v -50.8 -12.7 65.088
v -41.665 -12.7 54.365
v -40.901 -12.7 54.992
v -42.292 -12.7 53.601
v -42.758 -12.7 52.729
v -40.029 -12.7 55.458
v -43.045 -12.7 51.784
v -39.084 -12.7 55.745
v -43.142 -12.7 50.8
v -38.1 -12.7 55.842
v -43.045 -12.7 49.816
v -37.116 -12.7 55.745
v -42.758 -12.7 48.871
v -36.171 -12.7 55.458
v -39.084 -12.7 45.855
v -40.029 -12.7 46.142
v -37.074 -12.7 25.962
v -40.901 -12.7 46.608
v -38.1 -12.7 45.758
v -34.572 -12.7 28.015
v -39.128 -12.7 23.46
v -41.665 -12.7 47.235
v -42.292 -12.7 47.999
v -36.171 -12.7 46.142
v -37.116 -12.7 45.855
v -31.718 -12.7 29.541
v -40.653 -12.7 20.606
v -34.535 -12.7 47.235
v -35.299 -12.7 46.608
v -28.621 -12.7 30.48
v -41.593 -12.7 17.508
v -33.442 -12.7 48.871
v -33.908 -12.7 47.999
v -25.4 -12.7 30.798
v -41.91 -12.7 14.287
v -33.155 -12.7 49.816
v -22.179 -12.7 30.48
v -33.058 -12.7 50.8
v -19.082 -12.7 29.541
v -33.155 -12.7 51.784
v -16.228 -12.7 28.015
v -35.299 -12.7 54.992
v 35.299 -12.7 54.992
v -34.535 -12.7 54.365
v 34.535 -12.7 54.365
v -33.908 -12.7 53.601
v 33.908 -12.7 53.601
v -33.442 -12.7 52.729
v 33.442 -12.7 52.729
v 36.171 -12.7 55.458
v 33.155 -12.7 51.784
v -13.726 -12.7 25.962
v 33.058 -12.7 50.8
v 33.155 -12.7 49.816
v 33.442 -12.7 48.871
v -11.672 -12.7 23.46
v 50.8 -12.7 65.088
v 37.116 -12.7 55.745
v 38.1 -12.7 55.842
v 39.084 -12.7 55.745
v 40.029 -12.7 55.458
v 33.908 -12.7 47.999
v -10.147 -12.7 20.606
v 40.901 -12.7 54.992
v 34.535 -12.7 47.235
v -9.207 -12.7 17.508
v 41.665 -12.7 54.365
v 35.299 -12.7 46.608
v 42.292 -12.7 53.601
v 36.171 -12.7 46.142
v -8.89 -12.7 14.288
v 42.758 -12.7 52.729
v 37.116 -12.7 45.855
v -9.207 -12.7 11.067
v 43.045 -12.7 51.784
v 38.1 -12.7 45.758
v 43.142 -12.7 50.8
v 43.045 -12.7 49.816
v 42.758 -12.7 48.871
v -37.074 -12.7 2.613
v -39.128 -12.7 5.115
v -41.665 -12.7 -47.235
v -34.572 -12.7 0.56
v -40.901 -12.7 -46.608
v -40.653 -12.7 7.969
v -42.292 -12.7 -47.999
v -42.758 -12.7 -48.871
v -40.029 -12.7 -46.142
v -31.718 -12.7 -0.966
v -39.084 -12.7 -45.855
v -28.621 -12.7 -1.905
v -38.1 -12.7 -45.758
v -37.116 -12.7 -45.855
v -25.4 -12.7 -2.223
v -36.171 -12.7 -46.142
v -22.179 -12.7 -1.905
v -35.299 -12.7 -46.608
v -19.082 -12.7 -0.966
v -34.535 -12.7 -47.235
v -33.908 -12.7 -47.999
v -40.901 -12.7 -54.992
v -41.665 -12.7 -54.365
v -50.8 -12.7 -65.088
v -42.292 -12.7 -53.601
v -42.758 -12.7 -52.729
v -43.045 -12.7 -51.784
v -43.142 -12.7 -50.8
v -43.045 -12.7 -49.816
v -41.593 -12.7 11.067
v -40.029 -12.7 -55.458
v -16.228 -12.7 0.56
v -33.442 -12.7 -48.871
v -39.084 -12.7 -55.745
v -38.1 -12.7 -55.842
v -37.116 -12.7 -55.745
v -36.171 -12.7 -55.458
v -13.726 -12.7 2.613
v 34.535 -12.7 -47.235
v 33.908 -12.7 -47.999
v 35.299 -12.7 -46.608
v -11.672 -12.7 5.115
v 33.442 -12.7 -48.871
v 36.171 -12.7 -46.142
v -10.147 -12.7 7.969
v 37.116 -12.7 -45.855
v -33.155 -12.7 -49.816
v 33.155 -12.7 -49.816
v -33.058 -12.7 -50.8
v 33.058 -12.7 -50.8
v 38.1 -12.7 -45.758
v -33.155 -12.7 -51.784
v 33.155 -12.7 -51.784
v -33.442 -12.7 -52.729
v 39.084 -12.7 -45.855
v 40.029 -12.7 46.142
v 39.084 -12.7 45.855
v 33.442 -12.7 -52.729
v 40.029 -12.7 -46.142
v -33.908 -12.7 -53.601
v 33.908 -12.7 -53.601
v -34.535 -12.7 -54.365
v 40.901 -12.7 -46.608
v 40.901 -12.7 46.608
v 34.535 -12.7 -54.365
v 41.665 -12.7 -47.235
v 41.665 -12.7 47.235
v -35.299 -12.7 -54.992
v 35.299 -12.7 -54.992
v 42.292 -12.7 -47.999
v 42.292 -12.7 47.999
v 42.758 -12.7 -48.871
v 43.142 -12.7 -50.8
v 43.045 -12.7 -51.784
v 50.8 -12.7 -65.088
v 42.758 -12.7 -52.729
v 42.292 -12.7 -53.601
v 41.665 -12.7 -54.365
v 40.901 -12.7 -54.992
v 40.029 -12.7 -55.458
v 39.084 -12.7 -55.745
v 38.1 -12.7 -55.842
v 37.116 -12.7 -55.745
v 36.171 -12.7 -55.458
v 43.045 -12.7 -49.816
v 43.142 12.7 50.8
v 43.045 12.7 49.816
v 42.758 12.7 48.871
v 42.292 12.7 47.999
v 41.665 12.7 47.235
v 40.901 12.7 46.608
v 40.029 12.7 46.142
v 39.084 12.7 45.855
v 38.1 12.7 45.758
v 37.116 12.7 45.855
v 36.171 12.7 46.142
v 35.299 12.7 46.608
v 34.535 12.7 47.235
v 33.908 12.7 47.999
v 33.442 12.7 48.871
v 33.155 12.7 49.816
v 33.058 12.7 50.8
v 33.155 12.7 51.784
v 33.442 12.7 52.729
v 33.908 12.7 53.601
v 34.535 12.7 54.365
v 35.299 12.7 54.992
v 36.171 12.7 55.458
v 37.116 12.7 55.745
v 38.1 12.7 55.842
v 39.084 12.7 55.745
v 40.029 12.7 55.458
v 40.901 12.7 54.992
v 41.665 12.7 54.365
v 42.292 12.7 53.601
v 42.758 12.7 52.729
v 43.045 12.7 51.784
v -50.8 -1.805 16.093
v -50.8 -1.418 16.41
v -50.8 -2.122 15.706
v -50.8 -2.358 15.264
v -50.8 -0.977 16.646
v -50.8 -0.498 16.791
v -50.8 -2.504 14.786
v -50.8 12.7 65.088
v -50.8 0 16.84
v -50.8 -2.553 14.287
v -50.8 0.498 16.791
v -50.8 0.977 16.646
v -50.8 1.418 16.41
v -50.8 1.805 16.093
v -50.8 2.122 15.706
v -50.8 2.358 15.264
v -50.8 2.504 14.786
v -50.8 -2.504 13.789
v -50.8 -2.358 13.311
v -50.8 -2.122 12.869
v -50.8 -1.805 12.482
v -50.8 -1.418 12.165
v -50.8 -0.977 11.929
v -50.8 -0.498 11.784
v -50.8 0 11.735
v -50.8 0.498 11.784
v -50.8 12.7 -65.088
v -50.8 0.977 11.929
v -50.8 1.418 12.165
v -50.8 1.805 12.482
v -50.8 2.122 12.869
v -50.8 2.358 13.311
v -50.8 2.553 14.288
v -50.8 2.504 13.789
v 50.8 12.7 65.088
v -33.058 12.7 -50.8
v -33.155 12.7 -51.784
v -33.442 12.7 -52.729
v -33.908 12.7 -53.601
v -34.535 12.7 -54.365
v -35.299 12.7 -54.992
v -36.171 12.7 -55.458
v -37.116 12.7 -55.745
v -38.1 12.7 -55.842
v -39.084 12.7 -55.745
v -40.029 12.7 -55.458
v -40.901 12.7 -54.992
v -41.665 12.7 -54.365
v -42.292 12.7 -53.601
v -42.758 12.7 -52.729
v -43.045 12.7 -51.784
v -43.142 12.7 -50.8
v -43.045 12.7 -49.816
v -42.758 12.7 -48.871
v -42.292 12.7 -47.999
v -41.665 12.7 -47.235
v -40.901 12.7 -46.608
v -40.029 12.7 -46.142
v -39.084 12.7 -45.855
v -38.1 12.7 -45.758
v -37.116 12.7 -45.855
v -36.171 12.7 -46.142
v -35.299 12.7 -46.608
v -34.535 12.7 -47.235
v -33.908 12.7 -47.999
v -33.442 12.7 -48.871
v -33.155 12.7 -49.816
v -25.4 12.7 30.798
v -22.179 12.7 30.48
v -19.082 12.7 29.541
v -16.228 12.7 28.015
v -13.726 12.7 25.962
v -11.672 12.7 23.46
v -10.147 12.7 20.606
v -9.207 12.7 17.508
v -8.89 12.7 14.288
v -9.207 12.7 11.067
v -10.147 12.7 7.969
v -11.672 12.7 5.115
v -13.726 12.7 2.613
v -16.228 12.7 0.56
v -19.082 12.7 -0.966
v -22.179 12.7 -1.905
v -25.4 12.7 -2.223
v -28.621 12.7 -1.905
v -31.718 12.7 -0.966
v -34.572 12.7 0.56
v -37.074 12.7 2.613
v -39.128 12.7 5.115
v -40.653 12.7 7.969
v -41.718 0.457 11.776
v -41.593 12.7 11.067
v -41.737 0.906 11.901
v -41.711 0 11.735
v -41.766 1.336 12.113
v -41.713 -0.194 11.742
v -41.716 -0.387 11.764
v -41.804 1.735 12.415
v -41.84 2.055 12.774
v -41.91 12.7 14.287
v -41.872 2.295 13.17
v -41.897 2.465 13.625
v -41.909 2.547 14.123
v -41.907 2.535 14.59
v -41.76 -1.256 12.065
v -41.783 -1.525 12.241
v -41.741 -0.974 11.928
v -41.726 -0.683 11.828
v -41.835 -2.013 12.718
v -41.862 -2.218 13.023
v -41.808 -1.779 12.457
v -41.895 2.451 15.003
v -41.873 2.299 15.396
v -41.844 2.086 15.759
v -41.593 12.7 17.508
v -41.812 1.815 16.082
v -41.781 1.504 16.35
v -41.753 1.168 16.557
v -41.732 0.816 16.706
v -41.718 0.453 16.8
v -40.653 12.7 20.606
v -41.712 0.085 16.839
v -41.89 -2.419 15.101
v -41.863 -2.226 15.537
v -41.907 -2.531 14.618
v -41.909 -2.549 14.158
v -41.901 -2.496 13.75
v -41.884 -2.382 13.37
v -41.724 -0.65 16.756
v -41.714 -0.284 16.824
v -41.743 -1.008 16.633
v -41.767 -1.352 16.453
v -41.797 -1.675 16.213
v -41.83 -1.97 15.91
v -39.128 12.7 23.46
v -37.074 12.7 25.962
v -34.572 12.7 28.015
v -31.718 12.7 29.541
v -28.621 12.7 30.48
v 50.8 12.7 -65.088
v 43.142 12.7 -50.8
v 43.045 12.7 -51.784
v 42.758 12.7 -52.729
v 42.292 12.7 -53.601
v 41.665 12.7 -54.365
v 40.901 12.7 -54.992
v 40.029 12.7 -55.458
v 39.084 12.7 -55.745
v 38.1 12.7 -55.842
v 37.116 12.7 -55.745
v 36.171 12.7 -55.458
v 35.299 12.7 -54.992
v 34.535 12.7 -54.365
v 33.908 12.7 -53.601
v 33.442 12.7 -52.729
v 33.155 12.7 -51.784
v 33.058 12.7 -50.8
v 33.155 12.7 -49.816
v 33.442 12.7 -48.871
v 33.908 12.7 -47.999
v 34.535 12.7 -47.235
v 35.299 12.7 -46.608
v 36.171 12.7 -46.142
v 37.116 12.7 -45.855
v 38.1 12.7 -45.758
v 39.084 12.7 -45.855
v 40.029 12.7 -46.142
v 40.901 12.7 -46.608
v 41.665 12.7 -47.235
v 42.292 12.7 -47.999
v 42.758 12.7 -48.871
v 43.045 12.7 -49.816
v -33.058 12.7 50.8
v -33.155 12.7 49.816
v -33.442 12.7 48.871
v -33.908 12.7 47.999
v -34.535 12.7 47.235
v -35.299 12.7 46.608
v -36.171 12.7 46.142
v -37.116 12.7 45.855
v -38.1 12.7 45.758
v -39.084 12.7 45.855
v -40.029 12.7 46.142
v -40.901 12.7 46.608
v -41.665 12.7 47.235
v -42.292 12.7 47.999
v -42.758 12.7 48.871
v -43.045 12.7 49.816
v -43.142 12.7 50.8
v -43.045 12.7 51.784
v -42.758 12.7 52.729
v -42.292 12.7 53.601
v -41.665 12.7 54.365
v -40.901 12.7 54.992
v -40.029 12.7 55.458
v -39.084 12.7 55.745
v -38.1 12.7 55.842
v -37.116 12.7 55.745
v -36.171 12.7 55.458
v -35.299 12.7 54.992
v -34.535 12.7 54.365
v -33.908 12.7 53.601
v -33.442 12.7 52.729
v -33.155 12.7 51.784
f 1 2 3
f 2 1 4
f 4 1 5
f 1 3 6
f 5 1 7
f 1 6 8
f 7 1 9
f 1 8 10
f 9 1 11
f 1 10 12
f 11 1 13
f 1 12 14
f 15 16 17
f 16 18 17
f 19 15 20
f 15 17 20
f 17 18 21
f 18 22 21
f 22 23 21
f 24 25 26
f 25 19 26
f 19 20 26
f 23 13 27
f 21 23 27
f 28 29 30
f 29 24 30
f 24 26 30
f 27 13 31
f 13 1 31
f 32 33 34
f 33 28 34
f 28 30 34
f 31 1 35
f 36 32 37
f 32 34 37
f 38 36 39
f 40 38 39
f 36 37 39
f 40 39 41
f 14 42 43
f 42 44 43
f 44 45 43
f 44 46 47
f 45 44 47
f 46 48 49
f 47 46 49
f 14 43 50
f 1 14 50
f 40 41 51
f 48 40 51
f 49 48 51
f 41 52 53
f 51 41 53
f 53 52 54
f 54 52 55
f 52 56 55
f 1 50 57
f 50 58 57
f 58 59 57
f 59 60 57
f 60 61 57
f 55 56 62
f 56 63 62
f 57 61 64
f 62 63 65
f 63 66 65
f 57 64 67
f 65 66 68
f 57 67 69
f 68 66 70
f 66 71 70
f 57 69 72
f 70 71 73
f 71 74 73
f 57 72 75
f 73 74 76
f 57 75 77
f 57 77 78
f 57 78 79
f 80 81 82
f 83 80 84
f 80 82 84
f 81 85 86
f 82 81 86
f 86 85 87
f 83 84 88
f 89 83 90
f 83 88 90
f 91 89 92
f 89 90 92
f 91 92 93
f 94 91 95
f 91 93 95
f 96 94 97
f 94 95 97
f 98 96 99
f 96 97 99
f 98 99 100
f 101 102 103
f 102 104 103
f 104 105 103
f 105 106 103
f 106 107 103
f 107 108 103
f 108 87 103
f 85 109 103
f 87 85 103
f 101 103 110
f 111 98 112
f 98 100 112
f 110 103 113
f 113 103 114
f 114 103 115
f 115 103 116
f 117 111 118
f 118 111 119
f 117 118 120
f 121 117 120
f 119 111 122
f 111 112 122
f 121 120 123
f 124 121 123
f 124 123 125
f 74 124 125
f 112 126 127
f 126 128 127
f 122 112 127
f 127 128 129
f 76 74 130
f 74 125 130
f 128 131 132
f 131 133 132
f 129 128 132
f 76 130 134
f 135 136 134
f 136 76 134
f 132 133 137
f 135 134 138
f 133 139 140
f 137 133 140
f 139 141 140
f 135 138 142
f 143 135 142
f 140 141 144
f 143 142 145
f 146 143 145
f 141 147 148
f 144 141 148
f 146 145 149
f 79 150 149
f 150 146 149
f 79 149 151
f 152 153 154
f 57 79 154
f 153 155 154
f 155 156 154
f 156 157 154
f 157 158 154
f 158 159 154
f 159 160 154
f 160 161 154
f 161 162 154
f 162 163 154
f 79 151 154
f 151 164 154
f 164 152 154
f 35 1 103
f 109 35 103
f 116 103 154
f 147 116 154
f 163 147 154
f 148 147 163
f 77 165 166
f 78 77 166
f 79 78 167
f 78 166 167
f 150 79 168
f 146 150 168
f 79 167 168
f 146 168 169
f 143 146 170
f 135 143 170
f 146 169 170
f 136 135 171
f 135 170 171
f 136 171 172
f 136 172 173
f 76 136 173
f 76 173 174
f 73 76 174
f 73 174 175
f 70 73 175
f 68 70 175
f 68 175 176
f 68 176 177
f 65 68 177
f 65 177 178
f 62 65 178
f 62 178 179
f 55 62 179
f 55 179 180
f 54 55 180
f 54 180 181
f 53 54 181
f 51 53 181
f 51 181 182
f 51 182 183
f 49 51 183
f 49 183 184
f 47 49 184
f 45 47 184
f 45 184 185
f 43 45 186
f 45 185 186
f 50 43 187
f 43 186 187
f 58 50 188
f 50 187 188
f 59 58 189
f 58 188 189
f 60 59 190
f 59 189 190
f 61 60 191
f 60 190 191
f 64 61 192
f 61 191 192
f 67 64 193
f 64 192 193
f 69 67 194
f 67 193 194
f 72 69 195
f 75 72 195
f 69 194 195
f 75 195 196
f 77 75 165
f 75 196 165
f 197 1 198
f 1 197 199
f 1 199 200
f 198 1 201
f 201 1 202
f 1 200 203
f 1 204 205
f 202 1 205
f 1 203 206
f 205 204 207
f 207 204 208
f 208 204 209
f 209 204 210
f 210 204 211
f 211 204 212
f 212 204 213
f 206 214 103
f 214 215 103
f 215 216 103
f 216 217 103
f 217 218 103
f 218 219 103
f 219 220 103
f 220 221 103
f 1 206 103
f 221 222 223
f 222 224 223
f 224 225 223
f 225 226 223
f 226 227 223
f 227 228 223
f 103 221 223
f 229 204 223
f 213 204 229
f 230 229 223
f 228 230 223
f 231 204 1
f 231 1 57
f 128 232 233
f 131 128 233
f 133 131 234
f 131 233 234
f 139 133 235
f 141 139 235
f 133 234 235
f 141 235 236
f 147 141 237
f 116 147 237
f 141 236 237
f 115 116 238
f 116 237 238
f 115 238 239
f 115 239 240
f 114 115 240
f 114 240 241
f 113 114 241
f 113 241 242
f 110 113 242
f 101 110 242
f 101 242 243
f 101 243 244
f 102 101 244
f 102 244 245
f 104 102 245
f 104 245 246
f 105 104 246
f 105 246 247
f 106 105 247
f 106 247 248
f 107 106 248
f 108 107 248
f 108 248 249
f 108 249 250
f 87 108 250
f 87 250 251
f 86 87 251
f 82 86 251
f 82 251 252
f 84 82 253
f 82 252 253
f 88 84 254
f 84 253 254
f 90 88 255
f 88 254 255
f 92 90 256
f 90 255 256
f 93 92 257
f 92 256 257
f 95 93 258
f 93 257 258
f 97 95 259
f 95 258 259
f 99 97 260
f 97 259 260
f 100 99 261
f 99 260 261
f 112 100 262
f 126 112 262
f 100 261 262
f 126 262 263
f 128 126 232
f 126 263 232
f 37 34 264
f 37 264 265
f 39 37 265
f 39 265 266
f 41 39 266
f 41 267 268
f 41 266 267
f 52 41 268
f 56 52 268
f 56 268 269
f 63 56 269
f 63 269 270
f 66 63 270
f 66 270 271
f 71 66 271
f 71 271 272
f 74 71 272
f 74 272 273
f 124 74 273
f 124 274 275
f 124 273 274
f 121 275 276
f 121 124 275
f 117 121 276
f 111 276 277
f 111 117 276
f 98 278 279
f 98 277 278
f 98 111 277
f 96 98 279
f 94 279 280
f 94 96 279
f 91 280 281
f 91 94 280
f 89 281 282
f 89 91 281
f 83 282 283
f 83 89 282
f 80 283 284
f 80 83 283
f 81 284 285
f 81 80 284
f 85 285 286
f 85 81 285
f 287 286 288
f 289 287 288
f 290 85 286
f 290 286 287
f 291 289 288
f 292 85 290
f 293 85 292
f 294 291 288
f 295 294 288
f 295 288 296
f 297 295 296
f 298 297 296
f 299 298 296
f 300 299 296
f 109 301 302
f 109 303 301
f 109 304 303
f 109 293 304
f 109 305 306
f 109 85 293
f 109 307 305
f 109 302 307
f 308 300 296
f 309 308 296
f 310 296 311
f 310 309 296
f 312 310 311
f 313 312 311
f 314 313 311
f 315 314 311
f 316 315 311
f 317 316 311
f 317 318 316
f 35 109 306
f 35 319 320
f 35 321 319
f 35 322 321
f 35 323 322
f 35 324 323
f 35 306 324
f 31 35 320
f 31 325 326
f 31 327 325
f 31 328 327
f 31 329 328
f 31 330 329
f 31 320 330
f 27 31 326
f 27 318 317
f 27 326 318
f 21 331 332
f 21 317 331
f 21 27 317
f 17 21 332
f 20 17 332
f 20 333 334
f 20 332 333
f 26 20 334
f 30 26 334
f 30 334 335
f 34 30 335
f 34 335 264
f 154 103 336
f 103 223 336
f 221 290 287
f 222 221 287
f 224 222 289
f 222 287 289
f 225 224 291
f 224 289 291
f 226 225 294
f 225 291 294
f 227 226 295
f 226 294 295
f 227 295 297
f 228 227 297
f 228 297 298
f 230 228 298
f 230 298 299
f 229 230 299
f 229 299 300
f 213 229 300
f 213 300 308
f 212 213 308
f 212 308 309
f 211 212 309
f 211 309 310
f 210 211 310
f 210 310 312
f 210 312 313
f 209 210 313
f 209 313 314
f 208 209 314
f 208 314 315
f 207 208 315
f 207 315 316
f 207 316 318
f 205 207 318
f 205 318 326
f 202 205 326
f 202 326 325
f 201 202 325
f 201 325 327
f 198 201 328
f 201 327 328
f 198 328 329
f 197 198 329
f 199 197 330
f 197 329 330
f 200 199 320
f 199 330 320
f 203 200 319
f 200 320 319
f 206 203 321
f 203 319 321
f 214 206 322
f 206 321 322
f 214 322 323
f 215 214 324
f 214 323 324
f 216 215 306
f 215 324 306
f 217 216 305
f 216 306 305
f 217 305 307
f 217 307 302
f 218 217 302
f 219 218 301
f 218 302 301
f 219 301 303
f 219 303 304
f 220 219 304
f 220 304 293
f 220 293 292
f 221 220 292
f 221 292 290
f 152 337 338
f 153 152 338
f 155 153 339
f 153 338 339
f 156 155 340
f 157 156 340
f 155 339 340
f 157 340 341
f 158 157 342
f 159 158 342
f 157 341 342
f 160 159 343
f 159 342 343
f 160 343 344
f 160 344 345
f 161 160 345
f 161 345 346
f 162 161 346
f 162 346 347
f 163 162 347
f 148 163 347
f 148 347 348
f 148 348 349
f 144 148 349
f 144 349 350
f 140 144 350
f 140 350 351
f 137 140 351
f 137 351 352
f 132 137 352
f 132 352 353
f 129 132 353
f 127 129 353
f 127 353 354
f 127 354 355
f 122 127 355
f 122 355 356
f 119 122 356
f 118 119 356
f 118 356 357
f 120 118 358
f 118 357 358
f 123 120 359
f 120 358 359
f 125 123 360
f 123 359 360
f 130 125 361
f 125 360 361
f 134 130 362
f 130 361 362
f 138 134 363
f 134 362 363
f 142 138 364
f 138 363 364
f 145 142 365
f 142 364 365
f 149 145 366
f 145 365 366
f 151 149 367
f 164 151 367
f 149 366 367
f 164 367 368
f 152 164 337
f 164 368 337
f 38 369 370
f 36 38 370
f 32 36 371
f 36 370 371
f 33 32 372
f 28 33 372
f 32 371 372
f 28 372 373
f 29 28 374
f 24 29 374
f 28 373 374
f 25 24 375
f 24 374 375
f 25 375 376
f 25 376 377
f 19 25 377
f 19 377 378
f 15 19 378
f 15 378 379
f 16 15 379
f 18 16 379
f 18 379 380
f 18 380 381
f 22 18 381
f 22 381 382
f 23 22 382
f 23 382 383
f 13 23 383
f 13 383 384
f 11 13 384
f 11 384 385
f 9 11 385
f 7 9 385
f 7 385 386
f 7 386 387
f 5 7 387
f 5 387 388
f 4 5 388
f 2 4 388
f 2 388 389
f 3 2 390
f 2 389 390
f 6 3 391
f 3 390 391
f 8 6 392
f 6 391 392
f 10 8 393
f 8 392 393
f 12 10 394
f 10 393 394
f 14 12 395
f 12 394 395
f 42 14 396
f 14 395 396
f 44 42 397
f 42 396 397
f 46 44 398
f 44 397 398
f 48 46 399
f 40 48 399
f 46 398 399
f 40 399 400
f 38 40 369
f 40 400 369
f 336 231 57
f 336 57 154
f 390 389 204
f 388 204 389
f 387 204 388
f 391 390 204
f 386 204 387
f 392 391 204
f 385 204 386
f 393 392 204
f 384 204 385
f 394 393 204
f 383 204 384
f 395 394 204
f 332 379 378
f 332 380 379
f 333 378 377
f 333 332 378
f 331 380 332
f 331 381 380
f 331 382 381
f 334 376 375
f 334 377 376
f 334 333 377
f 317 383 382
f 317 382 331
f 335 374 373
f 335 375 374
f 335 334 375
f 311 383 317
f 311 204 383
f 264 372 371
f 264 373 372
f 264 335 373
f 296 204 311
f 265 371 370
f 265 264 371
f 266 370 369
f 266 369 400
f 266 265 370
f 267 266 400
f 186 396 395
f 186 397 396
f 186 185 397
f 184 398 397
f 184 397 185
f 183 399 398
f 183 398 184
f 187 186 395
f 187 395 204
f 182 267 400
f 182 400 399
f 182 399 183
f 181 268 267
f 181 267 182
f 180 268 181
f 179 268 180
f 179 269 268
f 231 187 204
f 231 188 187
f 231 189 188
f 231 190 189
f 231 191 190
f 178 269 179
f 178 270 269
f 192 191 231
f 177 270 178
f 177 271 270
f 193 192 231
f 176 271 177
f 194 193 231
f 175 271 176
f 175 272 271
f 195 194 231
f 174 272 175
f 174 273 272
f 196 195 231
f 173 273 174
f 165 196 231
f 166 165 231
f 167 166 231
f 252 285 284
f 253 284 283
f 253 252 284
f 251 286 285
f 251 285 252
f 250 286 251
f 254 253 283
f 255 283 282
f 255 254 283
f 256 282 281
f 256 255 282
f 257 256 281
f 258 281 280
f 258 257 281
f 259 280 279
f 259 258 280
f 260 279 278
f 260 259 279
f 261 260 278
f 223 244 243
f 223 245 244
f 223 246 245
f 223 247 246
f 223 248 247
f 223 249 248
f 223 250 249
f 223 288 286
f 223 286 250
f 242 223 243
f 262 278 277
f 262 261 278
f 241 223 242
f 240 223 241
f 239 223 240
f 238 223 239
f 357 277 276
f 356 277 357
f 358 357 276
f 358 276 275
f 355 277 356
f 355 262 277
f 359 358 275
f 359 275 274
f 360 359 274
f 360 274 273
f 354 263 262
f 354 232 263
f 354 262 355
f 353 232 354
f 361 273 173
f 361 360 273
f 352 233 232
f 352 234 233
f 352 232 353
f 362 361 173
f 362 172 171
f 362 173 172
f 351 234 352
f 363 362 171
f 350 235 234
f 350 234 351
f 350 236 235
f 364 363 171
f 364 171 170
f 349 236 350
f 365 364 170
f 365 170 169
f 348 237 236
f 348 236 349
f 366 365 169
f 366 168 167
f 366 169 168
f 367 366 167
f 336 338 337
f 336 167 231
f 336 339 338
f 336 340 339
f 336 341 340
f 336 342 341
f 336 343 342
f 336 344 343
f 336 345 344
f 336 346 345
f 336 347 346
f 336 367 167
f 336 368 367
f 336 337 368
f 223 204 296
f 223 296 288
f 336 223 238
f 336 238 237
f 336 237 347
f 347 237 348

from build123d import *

# Parameters (mm, degrees)
SKETCH1_W                   = 101.6
SKETCH1_H                   = 130.175
BOSS_EXTRUDE1_DEPTH         = 12.7
CUT_EXTRUDE1_DEPTH          = 87.383925914
CUT_EXTRUDE1_DEPTH_BACK     = 87.383925914
SKETCH2_R                   = 16.51
F_3_8_CLEARANCE_HOLE1_D     = 10.0838
F_1_4_20_TAPPED_HOLE1_D     = 5.1054
F_1_4_20_TAPPED_HOLE1_DEPTH = 16.51
F_1_4_20_TAPPED_HOLE1_TIP   = 1.533816902


with BuildPart() as part:
    # Sketch1 → Boss-Extrude1 (new, symmetric)
    with BuildSketch(Plane(origin=(0, 0, 0), x_dir=(1, 0, 0), z_dir=(0, 1, 0))):
        Rectangle(SKETCH1_W, SKETCH1_H)
    extrude(amount=BOSS_EXTRUDE1_DEPTH, both=True)

    # Sketch2 → Cut-Extrude1 (cut, two sides: drawn at the far end of the back side and taken through both)
    with BuildSketch(Plane(origin=(0, 12.7, 0), x_dir=(1, 0, 0), z_dir=(0, 1, 0)).offset(-CUT_EXTRUDE1_DEPTH_BACK)):
        with Locations(Location((-25.4, -14.2875, 0), (0, 0, 270))):
            Circle(SKETCH2_R)
    extrude(amount=CUT_EXTRUDE1_DEPTH + CUT_EXTRUDE1_DEPTH_BACK, mode=Mode.SUBTRACT)

    # 3/8 Clearance Hole1 (through all)
    with Locations(Plane(origin=(0, -12.7, 0), x_dir=(-1, 0, 0), z_dir=(0, -1, 0))):
        with Locations((-38.1, 50.8), (38.1, 50.8), (38.1, -50.8), (-38.1, -50.8)):
            Hole(F_3_8_CLEARANCE_HOLE1_D / 2)

    # 1/4-20 Tapped Hole1
    with Locations(Plane.ZY.offset(50.8)):
        with Locations((14.2875, 0)):
            Hole(F_1_4_20_TAPPED_HOLE1_D / 2, depth=F_1_4_20_TAPPED_HOLE1_DEPTH)
            with Locations((0, 0, -(F_1_4_20_TAPPED_HOLE1_DEPTH + F_1_4_20_TAPPED_HOLE1_TIP / 2))):  # 118° drill point
                Cone(0, F_1_4_20_TAPPED_HOLE1_D / 2, F_1_4_20_TAPPED_HOLE1_TIP, mode=Mode.SUBTRACT)


solid = part.part
